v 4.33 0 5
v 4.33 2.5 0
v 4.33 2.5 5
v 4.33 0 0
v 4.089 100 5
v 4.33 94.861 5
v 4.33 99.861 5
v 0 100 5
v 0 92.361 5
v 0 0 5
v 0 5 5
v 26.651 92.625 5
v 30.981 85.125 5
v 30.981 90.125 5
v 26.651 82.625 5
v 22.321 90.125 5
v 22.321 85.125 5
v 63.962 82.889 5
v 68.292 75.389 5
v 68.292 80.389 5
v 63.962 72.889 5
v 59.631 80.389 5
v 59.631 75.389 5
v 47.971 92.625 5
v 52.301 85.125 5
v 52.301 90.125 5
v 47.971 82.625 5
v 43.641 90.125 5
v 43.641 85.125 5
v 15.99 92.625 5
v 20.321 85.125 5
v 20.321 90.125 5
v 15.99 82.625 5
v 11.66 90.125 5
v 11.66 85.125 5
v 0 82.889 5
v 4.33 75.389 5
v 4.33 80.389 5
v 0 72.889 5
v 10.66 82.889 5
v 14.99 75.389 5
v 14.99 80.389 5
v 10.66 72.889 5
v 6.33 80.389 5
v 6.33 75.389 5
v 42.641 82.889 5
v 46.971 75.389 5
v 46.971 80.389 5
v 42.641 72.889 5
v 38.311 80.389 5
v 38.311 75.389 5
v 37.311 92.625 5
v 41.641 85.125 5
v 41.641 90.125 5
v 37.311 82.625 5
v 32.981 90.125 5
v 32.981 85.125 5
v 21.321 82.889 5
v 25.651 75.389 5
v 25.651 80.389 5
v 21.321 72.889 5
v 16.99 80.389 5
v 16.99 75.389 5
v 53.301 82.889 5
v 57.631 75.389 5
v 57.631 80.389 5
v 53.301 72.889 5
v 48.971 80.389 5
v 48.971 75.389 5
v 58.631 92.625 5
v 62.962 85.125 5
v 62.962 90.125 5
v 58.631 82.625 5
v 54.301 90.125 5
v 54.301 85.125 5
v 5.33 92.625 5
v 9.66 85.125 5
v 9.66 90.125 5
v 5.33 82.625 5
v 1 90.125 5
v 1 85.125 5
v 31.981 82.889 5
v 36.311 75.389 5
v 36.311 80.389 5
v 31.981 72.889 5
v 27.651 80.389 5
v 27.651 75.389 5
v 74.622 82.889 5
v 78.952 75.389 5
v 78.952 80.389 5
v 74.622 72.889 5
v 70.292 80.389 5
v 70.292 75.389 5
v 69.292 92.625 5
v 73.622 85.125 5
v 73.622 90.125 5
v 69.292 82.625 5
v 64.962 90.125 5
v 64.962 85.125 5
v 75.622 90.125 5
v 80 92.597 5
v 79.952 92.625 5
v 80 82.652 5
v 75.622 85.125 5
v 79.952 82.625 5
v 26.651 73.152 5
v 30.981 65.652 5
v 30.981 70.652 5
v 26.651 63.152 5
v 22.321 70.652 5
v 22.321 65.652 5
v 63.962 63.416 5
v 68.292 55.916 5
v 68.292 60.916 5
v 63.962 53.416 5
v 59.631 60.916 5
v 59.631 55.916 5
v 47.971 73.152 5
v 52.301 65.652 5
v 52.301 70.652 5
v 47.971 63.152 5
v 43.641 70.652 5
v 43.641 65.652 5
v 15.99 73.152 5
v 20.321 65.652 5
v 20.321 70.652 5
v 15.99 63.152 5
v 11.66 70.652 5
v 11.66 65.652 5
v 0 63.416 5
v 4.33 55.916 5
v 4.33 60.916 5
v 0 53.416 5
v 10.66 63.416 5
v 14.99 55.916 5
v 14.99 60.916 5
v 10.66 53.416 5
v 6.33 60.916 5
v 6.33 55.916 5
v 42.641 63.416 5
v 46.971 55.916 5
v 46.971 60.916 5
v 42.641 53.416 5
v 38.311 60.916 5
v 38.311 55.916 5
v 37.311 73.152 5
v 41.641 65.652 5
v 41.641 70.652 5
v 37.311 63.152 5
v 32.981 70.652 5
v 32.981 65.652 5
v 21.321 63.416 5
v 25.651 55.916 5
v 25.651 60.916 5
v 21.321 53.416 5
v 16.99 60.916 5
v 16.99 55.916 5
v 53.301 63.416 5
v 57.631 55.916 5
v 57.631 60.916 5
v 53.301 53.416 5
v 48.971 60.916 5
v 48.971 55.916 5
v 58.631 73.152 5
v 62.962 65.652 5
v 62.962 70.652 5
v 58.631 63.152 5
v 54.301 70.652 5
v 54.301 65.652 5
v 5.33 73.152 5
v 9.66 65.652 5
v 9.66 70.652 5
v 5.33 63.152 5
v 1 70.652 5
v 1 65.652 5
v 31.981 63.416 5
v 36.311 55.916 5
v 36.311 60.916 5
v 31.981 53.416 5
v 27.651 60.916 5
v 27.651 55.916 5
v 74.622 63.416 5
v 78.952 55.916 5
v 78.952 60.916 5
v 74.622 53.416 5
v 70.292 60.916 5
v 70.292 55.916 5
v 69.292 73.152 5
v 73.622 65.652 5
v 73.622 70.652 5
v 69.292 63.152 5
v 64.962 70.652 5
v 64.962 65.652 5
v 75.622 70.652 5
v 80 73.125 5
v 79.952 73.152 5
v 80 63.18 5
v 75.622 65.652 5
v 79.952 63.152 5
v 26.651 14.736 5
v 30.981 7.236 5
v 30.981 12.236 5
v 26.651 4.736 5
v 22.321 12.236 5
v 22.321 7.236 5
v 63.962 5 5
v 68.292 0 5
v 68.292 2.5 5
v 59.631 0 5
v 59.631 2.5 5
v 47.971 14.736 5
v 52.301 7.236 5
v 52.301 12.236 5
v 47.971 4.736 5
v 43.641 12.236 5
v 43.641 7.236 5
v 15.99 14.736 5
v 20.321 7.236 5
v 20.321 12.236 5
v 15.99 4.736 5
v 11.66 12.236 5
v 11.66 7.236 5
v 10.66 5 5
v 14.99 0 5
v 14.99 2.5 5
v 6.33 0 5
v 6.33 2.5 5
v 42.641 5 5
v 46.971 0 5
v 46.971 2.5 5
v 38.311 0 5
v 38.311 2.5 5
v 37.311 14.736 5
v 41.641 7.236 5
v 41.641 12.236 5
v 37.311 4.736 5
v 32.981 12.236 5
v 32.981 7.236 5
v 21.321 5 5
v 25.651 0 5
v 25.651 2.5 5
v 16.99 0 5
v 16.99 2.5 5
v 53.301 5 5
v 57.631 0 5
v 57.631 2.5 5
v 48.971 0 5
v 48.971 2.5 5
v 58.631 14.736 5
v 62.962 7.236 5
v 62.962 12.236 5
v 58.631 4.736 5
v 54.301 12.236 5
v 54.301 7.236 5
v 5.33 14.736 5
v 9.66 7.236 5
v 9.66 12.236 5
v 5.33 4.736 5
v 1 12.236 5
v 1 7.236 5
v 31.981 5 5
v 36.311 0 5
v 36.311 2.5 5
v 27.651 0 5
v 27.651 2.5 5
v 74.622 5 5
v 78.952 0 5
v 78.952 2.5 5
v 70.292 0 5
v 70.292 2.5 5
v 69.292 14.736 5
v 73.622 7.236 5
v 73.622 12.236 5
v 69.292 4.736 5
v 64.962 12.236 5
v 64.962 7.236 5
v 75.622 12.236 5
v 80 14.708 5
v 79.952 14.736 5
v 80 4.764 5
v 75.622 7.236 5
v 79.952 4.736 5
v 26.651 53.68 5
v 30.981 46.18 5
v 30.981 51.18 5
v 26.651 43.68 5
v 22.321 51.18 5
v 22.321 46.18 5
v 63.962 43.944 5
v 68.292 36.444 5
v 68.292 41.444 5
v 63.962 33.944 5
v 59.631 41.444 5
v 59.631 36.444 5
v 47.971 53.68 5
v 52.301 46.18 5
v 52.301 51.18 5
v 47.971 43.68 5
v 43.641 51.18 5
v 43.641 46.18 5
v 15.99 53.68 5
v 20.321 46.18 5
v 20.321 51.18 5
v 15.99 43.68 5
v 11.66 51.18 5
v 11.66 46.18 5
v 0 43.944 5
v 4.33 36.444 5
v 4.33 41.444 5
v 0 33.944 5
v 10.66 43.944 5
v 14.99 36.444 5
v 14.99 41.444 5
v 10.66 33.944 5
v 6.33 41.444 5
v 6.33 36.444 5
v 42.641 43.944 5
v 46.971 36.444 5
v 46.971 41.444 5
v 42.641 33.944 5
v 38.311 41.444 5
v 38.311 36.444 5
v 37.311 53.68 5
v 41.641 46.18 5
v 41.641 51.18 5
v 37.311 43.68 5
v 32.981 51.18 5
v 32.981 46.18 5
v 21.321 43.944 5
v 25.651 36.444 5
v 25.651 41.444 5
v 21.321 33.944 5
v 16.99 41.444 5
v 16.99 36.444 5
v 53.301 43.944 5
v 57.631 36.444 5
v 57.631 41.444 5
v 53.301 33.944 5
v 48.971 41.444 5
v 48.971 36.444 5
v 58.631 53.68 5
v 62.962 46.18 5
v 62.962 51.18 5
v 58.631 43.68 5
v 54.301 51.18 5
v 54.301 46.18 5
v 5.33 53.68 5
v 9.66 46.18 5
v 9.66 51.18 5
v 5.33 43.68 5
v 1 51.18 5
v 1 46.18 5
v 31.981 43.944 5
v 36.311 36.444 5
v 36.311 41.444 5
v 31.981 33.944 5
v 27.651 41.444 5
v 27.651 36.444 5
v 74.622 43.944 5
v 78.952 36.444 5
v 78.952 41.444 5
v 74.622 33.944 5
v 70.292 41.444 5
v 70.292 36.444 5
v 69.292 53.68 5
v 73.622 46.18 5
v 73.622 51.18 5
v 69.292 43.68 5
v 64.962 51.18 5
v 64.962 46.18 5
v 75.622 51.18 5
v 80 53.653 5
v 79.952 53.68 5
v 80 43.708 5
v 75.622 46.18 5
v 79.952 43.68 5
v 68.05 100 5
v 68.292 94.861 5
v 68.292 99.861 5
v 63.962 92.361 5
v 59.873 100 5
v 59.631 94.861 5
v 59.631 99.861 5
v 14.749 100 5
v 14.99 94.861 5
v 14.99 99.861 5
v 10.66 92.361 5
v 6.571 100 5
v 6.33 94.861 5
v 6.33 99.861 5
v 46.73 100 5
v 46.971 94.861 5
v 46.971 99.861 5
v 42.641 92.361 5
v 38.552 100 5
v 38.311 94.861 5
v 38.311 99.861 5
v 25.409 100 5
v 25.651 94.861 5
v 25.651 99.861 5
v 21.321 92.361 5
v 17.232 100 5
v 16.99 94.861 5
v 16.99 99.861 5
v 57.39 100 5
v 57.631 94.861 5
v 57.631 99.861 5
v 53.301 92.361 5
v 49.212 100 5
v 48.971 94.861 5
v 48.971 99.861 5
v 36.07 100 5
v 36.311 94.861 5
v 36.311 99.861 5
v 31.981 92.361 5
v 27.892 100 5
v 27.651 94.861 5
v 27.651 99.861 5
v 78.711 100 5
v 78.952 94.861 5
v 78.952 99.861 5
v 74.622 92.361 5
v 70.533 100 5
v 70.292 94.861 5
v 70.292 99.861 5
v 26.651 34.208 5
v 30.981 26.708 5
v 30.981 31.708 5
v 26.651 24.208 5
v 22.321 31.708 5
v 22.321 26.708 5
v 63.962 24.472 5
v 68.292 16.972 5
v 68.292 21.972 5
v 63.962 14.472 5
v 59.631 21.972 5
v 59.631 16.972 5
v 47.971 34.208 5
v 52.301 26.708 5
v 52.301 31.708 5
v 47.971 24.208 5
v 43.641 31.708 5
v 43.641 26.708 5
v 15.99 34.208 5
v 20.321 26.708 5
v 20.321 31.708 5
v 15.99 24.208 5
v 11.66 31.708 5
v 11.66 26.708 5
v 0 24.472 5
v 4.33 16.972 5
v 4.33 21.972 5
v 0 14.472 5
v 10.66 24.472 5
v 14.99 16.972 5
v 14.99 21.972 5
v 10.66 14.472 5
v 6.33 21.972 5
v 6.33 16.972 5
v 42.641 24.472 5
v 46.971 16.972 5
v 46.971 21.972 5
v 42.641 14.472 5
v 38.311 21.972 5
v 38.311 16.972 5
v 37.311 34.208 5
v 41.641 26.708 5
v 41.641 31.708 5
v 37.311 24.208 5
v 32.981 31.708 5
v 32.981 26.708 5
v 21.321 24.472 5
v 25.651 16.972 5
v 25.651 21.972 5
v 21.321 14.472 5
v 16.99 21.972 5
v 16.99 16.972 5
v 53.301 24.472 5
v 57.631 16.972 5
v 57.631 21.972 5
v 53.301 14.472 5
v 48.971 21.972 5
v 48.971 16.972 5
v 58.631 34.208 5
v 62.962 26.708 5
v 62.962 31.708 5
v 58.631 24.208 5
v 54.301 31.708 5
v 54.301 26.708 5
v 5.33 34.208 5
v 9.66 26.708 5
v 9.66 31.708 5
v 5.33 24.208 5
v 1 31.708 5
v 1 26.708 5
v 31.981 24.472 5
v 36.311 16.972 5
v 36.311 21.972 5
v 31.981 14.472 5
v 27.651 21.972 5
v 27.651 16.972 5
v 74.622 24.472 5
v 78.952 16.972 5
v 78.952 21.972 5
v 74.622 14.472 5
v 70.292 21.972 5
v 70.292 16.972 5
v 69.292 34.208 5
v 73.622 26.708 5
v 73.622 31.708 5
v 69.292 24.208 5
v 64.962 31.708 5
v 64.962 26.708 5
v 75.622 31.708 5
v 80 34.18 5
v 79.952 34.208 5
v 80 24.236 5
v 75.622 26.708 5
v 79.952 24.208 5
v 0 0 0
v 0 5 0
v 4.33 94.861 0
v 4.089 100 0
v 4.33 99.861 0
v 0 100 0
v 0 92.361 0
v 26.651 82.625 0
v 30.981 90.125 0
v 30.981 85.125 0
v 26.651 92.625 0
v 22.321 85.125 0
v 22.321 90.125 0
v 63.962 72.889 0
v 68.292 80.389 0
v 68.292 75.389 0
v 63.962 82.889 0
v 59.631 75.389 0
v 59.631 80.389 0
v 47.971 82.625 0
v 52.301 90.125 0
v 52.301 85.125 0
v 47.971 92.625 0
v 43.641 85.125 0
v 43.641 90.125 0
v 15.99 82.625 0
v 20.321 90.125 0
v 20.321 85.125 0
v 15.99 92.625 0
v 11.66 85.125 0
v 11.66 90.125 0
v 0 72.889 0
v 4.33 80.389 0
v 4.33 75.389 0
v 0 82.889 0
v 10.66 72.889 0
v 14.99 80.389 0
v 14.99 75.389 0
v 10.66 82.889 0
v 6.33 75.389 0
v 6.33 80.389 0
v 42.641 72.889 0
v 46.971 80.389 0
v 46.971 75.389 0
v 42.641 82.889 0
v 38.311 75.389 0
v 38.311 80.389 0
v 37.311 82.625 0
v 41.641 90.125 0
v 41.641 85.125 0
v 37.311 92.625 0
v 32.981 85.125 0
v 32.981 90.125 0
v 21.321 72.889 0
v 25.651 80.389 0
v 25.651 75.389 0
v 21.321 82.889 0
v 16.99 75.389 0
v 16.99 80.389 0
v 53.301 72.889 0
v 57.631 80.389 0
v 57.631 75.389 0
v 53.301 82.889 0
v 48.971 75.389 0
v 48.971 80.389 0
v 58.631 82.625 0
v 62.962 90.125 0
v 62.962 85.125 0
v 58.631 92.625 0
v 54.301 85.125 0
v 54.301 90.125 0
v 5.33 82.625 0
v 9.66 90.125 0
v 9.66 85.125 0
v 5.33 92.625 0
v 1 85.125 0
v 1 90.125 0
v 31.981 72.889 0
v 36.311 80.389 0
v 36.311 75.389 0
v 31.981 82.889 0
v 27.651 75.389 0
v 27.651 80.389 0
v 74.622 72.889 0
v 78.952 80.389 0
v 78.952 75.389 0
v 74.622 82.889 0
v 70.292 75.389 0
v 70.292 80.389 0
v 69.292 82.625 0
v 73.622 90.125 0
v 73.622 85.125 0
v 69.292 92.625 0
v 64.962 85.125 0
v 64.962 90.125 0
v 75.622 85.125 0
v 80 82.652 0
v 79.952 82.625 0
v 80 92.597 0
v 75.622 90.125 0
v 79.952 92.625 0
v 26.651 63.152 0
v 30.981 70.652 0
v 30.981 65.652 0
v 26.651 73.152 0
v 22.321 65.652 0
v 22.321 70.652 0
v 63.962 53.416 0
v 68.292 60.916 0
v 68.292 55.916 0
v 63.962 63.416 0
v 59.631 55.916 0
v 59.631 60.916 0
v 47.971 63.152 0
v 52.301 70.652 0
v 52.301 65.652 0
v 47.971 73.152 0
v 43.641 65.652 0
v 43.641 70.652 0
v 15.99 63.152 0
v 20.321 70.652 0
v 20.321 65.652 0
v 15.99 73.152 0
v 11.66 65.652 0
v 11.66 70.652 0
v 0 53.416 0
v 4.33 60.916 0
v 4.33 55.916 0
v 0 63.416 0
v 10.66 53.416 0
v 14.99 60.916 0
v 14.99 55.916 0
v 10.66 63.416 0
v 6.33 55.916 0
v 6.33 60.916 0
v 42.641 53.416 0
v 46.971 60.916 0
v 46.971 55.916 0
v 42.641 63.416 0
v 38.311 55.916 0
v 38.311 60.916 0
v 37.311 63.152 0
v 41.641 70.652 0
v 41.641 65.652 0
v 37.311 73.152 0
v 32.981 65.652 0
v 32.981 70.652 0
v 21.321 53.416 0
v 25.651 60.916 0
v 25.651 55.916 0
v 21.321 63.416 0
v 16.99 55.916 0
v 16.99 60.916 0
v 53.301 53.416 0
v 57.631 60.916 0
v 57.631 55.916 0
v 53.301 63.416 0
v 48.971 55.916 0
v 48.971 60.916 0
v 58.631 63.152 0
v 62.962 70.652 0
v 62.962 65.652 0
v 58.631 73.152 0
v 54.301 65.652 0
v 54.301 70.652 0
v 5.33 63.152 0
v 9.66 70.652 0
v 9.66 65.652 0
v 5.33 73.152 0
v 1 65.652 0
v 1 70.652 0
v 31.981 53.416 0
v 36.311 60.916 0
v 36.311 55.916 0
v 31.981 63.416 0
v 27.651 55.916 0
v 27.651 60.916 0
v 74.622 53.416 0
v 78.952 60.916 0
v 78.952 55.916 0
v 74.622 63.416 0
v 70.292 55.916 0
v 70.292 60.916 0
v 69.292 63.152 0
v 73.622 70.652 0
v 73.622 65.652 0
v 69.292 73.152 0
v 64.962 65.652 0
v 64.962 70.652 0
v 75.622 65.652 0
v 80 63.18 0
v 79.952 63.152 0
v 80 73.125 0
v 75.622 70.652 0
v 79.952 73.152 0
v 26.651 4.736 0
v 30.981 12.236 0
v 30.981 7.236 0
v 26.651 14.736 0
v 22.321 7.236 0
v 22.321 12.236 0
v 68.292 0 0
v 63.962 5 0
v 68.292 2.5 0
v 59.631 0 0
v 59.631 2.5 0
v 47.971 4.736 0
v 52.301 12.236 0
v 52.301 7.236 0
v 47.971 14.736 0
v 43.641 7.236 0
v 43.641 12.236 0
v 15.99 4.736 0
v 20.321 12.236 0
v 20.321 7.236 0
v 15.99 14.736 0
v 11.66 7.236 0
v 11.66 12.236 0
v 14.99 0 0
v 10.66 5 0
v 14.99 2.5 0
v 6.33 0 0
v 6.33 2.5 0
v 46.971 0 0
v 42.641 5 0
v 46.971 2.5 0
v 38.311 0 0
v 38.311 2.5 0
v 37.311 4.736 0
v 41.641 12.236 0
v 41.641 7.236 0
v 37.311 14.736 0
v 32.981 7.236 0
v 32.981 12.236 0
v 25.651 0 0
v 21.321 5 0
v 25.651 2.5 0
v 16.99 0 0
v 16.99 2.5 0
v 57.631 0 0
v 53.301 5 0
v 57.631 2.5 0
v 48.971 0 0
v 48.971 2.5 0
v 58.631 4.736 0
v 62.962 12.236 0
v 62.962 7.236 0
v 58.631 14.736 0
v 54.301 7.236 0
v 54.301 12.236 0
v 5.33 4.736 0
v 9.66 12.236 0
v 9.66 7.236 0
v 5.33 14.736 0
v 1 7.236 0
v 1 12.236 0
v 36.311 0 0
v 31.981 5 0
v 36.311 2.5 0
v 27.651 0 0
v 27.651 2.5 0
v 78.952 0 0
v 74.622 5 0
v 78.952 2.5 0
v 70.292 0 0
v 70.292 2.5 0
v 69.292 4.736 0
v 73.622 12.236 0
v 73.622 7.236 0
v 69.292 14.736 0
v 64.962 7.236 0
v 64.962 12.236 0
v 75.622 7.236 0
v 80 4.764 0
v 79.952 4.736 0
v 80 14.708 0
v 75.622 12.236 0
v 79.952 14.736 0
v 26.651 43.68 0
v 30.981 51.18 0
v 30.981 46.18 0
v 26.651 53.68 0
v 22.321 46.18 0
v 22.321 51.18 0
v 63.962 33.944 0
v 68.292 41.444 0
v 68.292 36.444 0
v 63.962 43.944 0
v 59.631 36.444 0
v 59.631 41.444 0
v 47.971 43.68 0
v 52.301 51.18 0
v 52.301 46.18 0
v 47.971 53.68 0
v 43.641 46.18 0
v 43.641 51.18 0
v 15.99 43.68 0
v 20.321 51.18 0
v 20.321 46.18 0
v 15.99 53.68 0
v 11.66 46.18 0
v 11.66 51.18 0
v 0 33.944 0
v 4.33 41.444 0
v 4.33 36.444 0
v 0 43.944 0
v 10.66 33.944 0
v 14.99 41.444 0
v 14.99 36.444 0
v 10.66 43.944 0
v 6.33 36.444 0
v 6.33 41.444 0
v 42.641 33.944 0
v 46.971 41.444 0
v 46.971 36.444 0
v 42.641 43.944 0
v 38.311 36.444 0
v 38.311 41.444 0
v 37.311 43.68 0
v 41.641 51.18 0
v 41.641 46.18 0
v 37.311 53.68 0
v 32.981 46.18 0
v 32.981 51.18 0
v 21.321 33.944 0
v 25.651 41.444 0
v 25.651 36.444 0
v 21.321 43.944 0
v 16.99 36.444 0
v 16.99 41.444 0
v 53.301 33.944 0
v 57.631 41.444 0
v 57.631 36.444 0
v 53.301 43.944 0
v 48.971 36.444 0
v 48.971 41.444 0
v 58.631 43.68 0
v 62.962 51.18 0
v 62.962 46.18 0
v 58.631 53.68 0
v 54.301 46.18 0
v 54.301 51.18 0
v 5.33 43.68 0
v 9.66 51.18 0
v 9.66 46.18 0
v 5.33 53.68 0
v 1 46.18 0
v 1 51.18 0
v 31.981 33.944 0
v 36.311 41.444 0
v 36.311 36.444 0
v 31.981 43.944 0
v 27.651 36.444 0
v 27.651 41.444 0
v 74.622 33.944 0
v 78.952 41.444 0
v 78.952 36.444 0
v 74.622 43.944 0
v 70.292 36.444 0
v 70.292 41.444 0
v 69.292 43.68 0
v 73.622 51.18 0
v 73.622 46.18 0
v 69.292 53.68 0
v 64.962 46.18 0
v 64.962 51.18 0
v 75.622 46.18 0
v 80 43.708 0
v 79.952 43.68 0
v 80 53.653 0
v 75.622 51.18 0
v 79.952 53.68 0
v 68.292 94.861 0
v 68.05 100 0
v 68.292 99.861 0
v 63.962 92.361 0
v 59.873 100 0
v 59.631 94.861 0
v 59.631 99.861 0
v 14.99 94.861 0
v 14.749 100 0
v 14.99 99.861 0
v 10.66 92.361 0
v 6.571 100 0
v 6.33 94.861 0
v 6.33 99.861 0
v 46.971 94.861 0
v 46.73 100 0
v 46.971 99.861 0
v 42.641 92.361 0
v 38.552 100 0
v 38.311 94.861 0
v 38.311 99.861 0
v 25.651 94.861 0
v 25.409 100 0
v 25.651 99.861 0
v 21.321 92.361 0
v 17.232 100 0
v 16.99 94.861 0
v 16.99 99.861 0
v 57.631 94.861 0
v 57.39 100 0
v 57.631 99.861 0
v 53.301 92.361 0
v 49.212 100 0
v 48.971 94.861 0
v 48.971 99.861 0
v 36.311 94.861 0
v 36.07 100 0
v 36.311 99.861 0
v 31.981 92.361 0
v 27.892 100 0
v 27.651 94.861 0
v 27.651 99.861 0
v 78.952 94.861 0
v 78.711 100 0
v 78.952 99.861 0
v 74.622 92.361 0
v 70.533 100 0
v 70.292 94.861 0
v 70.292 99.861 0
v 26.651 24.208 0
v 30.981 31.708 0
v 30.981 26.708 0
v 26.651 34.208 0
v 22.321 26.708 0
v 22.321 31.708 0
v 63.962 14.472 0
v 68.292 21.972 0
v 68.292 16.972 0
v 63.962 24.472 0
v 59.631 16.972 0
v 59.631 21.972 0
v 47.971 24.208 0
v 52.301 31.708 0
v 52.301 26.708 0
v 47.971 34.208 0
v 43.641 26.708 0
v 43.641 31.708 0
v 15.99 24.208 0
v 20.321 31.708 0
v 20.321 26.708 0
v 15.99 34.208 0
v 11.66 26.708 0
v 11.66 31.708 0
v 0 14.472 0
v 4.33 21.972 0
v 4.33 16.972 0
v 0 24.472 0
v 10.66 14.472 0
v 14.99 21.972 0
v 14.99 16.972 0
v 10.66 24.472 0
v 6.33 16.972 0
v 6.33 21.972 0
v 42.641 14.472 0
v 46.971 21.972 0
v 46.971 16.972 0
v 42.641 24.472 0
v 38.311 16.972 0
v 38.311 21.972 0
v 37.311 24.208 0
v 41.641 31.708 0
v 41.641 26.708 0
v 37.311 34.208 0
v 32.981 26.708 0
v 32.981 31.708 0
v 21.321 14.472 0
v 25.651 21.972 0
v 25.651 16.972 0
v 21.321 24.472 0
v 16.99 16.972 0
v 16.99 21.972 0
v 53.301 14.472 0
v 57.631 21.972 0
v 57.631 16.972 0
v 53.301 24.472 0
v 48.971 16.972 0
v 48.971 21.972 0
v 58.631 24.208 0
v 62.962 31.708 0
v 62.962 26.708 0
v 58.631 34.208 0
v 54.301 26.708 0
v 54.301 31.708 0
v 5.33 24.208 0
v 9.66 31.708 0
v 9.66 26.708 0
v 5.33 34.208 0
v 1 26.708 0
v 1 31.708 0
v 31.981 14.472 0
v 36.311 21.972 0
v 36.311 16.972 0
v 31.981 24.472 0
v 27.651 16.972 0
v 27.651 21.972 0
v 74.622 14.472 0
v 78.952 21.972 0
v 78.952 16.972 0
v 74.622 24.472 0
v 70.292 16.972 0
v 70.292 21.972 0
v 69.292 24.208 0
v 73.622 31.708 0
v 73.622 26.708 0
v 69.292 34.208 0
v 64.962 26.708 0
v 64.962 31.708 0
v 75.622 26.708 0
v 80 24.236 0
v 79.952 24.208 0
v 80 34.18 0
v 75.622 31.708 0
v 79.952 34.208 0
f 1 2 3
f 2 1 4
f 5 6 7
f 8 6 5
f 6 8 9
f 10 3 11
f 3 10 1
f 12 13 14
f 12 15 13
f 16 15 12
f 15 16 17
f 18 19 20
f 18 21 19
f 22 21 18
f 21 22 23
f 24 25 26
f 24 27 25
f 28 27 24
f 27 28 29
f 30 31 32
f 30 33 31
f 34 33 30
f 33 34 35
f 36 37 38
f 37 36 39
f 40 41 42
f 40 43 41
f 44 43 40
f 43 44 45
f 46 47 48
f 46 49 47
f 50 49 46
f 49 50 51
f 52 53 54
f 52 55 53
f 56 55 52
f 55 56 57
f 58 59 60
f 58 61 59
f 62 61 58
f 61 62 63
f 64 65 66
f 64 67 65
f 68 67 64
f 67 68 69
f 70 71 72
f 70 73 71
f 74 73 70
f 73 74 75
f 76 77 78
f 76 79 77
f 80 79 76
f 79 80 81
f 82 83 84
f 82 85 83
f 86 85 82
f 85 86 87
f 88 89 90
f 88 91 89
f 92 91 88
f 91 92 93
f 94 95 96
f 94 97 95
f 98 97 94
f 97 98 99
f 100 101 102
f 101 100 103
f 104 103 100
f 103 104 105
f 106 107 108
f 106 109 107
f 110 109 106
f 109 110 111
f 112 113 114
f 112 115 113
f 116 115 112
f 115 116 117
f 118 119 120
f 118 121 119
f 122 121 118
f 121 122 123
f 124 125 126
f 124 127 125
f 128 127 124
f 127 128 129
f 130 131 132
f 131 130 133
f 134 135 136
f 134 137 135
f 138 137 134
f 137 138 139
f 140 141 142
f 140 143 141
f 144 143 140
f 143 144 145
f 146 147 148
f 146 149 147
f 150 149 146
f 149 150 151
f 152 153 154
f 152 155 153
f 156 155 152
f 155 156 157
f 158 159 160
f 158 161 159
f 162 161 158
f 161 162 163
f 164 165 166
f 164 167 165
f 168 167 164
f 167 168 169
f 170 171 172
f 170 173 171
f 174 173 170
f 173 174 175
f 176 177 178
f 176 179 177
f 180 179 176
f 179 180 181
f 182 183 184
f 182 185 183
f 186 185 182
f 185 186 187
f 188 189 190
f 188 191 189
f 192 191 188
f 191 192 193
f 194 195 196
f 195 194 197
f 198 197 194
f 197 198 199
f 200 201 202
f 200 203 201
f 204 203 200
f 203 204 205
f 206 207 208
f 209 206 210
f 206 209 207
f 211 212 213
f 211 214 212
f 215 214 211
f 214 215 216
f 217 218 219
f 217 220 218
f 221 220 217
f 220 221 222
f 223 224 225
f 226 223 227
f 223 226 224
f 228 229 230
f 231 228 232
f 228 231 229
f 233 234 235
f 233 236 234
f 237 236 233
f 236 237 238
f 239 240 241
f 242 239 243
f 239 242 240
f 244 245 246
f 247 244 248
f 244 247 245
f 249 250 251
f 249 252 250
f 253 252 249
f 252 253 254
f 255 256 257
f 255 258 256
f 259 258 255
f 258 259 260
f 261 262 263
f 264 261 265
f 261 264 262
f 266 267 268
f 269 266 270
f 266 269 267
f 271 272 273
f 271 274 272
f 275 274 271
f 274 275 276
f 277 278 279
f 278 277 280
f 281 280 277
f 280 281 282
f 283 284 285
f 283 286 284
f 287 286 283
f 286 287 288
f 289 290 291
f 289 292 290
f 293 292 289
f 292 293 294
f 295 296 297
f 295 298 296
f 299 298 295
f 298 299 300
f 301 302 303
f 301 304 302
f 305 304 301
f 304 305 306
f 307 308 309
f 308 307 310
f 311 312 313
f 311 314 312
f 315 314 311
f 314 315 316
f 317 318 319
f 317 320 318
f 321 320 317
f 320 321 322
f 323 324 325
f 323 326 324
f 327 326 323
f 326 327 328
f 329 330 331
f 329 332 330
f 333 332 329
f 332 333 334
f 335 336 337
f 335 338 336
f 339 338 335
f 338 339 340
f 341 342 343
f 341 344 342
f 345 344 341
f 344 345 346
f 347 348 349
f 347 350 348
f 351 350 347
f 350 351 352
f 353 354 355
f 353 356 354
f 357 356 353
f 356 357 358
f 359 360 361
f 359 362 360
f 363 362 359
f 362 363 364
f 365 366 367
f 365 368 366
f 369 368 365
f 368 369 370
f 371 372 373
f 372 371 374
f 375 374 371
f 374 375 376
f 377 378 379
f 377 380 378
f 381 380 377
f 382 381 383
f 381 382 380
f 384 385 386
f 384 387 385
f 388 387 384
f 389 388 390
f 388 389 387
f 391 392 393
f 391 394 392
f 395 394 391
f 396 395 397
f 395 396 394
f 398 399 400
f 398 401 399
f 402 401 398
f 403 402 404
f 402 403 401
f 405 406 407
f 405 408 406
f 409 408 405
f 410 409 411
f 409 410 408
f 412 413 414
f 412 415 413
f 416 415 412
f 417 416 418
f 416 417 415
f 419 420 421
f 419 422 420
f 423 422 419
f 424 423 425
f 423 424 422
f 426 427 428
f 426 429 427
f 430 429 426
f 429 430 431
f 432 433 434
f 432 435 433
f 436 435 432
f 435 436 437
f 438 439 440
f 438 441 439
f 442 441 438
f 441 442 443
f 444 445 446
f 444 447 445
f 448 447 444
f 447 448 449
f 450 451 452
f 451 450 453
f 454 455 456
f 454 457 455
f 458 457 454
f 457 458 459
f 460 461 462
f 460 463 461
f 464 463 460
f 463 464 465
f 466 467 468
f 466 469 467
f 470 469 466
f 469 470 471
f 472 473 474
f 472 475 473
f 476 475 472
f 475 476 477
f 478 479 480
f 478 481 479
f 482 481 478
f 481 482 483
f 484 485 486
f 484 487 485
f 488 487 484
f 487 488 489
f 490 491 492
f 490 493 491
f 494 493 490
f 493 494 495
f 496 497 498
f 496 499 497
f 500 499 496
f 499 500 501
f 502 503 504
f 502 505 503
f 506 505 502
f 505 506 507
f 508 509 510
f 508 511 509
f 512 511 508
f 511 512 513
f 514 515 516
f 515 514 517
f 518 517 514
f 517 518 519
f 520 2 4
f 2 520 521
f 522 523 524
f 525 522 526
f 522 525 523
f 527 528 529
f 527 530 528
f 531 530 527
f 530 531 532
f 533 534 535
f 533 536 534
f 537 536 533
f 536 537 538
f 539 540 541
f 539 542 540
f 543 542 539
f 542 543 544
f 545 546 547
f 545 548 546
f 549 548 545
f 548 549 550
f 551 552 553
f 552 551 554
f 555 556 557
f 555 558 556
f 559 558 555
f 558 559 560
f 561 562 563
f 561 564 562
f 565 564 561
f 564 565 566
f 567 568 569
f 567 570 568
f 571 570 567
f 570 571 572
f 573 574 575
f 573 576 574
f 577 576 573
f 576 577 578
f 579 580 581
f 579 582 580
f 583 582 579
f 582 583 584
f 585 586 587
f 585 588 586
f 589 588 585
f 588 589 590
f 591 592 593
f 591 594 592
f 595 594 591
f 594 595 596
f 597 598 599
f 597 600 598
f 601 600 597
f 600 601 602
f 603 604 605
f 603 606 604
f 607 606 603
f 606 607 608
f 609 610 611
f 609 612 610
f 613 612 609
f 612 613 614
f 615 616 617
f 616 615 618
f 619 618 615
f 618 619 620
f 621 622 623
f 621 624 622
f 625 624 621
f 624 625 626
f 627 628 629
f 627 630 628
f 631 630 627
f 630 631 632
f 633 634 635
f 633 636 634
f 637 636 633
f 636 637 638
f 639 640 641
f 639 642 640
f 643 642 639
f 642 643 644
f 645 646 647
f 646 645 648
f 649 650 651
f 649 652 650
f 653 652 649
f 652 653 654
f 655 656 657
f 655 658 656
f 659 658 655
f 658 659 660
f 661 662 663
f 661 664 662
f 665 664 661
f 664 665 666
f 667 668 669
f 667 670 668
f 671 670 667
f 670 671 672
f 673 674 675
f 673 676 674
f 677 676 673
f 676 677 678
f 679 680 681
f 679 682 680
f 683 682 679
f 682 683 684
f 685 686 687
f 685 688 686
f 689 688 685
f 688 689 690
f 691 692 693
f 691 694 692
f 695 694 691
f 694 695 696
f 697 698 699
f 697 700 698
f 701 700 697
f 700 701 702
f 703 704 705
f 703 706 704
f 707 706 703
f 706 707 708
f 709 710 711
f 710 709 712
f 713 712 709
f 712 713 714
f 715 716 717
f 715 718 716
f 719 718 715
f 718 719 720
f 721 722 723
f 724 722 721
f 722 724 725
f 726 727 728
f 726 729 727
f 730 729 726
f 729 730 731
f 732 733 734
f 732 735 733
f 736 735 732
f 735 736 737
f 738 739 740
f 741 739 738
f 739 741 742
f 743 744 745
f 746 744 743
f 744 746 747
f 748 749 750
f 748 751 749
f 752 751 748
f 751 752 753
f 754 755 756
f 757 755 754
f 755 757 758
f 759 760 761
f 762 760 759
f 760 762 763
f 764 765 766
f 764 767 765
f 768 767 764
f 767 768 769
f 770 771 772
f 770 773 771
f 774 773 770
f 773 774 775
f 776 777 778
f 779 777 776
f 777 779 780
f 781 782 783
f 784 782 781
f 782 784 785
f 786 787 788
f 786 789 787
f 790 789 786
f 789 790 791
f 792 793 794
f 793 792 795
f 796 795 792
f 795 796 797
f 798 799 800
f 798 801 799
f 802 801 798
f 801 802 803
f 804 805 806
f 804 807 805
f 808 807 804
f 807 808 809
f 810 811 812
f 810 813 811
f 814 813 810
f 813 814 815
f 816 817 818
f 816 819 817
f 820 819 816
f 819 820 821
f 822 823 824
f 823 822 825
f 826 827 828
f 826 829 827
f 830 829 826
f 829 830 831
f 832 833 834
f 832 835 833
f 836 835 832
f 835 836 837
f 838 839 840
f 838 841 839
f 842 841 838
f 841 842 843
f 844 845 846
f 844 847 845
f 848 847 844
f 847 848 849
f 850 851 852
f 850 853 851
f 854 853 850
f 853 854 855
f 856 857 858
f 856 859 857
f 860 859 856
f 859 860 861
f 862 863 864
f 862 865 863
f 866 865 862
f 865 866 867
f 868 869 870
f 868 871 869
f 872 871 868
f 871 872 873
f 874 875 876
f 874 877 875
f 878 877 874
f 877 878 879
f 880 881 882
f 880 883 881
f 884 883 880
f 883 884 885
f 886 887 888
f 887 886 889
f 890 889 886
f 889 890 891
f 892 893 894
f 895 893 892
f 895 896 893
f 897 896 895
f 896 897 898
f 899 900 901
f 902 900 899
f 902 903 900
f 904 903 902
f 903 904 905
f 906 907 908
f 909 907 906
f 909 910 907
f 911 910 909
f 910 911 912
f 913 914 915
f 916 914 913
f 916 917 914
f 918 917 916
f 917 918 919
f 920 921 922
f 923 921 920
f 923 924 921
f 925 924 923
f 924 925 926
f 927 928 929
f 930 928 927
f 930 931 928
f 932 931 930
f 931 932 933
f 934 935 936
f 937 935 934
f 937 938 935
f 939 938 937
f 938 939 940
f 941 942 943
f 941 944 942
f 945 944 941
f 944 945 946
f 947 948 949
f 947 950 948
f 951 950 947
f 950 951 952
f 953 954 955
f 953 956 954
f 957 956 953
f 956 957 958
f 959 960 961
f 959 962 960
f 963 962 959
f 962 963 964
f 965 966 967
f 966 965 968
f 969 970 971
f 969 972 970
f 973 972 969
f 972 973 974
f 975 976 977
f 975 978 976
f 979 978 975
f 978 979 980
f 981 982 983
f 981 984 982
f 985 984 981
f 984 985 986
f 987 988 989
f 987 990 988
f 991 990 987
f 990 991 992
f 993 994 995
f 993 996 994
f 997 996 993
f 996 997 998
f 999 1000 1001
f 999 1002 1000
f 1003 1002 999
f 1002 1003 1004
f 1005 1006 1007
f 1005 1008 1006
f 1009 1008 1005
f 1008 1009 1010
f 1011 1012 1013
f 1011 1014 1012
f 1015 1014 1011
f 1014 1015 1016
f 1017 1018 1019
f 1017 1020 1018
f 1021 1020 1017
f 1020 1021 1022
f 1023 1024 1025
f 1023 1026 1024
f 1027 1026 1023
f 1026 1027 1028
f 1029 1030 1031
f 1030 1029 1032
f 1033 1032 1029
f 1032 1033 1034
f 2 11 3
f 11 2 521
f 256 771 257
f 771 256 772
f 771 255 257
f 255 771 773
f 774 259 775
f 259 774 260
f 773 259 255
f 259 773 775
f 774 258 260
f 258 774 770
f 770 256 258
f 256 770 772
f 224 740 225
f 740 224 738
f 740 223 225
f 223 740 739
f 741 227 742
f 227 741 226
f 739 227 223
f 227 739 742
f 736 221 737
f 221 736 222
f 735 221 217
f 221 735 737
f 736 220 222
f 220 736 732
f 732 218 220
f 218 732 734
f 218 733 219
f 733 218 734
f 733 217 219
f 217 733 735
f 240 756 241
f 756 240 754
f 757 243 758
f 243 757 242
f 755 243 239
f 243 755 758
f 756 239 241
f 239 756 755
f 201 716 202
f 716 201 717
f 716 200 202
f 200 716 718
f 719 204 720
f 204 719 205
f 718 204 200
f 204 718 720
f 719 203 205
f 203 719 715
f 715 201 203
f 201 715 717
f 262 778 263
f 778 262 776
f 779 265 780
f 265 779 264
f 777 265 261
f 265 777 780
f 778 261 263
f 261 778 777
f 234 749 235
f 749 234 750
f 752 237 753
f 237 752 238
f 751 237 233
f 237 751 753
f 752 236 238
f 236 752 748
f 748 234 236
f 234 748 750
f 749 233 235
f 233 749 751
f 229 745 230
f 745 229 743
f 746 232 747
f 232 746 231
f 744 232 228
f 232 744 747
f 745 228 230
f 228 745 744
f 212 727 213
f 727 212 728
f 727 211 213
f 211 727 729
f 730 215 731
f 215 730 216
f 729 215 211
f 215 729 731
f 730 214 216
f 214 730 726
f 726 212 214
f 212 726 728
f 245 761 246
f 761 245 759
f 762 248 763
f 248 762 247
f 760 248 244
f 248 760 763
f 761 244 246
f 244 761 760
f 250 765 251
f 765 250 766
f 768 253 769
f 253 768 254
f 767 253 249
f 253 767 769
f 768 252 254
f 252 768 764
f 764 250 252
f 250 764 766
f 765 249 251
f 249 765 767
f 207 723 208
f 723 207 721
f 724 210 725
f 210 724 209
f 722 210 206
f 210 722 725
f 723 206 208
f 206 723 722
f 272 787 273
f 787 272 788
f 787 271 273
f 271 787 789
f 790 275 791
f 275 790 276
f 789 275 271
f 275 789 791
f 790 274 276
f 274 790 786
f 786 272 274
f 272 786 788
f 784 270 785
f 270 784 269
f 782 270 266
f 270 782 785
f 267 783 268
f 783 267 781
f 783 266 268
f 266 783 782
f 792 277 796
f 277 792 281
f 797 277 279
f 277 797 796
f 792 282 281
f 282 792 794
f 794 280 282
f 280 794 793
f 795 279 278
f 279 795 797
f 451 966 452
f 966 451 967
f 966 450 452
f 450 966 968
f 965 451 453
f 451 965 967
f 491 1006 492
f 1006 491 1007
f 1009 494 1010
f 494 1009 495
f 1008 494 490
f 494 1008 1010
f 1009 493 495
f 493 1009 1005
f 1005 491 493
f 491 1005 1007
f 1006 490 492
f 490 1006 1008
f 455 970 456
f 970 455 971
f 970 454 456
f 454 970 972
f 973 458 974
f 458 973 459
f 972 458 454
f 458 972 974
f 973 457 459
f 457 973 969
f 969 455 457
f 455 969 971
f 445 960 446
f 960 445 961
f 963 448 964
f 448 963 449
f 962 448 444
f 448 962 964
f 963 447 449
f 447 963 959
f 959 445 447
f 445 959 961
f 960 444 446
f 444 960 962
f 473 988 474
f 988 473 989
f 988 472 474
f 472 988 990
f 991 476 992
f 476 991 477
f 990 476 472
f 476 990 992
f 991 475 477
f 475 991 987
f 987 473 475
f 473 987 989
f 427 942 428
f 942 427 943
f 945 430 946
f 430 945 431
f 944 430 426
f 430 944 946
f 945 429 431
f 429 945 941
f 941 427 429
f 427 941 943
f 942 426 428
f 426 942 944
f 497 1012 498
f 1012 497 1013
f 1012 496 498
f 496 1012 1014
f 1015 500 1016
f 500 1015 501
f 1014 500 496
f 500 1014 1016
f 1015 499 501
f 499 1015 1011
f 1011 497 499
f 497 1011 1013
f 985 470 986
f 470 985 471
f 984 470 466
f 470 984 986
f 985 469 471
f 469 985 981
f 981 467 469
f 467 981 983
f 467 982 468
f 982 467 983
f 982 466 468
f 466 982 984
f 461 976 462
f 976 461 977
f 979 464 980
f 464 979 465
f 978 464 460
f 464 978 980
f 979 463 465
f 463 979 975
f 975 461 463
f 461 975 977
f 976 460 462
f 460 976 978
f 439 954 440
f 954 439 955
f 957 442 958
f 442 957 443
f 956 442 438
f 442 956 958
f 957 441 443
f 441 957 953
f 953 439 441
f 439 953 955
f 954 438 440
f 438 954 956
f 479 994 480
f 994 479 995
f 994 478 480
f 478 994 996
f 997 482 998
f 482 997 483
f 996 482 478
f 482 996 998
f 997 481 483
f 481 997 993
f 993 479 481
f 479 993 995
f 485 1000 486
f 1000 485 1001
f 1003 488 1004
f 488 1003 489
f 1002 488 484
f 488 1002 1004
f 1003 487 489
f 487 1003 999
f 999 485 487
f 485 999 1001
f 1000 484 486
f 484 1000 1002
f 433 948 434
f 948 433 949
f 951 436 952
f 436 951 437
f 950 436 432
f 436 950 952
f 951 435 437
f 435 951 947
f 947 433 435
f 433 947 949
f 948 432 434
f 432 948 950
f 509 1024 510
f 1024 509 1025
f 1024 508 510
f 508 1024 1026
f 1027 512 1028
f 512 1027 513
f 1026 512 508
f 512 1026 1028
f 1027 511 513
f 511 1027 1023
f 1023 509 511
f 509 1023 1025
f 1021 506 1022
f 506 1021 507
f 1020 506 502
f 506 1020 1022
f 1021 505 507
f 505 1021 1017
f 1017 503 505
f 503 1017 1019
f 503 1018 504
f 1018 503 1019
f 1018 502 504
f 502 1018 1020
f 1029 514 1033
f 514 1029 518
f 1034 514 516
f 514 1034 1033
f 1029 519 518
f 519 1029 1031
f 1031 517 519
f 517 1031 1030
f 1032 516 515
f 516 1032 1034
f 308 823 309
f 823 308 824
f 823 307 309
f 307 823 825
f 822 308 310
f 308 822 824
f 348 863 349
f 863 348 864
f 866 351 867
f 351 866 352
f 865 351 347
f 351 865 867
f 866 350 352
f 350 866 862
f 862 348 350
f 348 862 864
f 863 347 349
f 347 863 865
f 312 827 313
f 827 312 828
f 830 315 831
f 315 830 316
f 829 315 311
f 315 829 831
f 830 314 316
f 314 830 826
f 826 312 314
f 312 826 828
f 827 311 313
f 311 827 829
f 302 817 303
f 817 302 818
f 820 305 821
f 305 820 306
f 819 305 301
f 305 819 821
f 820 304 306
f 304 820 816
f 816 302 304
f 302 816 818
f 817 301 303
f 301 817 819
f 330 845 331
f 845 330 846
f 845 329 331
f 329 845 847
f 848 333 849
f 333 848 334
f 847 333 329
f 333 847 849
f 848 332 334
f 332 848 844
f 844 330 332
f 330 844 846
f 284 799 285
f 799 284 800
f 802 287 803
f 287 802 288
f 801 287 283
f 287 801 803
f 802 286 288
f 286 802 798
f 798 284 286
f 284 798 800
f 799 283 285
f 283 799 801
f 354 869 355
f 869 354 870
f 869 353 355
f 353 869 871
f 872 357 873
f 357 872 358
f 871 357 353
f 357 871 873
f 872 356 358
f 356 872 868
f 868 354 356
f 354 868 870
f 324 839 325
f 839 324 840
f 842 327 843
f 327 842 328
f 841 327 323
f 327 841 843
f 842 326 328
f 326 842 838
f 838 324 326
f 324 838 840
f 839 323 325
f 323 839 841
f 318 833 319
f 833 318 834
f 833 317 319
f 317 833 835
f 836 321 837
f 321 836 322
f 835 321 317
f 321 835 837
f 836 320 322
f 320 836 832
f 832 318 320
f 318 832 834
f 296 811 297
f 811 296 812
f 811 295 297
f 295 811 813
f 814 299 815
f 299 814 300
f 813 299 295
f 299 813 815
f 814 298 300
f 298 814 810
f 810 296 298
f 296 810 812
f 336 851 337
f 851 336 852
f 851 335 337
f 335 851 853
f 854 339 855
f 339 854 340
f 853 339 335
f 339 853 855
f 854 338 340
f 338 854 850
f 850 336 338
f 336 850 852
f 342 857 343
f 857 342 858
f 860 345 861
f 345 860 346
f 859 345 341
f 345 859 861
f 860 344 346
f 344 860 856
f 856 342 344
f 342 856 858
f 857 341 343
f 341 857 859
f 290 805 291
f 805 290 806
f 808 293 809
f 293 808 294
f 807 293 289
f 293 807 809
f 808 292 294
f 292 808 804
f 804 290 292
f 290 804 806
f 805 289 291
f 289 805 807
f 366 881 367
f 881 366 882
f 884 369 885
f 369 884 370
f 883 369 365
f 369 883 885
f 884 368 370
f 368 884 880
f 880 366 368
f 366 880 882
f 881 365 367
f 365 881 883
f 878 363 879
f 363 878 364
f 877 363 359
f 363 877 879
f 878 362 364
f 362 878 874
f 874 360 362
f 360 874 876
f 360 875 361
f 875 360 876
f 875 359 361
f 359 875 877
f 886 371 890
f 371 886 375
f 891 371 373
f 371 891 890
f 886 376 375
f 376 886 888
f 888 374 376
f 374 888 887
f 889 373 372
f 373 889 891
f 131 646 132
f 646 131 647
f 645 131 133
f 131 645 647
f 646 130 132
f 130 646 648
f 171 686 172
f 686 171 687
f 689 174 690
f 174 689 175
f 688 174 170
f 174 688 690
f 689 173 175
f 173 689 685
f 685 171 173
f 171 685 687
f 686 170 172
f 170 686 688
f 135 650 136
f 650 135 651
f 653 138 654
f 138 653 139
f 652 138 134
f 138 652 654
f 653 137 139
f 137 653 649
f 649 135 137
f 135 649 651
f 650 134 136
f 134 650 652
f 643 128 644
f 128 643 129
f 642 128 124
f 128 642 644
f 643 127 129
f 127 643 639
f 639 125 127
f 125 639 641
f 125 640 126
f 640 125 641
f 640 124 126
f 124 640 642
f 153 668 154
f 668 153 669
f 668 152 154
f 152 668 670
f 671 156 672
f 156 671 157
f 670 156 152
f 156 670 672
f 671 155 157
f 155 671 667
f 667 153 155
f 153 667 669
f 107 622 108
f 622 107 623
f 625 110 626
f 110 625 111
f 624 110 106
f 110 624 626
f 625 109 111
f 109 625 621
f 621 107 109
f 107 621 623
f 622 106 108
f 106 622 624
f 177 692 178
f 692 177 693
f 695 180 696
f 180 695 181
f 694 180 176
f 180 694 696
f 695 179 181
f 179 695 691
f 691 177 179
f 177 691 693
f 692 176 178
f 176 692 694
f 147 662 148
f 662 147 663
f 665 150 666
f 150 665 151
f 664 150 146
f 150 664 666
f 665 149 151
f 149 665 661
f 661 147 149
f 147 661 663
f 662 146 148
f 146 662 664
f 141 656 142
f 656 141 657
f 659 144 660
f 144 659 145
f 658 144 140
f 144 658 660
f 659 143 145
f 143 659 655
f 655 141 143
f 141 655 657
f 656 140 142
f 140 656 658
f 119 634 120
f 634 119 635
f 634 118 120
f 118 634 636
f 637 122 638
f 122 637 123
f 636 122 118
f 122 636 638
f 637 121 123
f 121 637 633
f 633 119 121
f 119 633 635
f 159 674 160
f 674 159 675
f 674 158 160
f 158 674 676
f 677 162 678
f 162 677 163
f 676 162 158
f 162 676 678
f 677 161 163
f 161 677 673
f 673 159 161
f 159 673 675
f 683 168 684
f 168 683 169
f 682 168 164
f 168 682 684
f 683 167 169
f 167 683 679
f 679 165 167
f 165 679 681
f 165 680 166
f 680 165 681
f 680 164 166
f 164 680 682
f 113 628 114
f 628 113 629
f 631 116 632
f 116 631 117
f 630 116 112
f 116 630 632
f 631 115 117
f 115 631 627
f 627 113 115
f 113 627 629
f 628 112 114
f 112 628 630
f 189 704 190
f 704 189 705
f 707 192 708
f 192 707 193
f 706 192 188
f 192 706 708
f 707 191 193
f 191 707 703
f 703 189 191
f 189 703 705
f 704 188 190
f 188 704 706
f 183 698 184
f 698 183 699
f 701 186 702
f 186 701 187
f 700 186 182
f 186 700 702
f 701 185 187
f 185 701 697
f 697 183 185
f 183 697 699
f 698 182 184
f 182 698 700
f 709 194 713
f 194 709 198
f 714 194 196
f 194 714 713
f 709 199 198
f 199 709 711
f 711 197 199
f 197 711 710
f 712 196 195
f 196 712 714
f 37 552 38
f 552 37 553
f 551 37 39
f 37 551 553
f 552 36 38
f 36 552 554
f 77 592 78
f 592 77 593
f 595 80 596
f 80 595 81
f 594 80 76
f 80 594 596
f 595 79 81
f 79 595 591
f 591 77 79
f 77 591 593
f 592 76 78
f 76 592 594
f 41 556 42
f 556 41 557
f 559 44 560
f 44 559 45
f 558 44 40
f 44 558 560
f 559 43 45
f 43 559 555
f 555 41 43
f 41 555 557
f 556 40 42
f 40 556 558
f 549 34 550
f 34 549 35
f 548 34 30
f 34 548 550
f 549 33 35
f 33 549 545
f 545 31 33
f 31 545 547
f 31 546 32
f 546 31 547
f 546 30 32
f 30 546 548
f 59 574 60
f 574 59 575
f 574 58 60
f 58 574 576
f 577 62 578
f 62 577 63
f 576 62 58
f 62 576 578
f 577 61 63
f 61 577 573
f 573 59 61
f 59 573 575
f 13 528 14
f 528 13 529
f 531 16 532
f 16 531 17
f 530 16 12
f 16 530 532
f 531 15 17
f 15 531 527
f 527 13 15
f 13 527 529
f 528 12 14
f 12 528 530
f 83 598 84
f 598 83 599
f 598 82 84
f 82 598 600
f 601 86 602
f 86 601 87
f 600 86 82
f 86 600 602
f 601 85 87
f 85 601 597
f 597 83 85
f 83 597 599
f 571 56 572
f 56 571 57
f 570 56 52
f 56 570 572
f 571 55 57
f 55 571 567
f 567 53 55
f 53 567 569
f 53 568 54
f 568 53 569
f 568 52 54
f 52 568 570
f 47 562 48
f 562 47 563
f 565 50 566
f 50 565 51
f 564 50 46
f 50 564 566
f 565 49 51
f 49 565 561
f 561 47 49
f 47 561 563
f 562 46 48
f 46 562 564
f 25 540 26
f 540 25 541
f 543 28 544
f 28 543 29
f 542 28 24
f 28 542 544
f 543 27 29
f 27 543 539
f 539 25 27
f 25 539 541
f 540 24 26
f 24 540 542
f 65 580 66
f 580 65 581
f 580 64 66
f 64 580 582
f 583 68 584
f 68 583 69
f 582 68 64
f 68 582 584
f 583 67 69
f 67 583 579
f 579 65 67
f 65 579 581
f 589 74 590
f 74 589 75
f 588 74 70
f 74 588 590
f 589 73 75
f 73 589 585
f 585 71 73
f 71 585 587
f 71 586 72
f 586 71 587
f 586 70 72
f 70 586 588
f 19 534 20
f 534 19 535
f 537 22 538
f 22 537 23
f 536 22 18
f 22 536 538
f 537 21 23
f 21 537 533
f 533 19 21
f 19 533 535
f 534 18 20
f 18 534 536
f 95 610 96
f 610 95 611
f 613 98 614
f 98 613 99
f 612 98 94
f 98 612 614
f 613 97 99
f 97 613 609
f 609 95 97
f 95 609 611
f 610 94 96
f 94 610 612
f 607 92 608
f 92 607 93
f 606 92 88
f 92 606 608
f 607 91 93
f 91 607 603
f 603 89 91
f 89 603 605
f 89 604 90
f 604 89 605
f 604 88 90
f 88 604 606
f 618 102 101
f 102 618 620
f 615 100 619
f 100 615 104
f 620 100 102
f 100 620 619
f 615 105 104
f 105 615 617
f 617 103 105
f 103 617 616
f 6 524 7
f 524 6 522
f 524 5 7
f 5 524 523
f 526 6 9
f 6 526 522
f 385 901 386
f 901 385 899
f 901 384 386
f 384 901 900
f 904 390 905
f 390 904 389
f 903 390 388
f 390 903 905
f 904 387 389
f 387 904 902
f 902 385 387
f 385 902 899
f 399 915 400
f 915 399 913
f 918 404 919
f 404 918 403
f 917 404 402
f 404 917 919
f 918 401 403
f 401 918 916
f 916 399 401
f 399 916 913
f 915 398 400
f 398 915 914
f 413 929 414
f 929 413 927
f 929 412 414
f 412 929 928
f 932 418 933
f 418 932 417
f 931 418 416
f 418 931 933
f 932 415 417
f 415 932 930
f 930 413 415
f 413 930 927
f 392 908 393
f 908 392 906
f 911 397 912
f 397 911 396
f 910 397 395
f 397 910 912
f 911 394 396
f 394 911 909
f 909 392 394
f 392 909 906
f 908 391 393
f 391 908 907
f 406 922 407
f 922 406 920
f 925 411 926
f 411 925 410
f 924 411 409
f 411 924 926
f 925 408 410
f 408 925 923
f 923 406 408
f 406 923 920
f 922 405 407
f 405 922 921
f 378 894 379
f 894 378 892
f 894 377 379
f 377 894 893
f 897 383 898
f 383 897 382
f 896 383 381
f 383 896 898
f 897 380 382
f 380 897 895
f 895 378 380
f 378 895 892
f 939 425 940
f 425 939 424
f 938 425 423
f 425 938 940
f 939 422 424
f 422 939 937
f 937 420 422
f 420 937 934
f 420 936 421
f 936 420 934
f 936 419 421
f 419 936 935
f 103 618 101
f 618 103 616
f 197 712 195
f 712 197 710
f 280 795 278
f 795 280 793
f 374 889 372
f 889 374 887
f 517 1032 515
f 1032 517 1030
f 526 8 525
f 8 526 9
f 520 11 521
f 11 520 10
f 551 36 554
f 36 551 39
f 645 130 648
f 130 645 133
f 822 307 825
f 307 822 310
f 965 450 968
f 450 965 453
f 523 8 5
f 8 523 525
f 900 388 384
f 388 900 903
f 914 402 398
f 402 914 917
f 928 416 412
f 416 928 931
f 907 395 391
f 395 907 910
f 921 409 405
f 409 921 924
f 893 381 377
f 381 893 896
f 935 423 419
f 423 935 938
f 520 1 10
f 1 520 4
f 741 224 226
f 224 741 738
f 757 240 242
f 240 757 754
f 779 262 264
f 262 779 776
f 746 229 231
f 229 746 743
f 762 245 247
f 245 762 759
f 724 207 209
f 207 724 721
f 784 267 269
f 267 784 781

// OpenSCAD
$fn=50;

module hexagon(extrusion_height, radius) {
    rotate([0, 0, 90])
    cylinder($fn=6, h=extrusion_height, r=radius);
}

module hexagons(extrusion_height, radius, distance, x_reps, y_reps) {
    $hexagon_height = radius*2;
    $side = radius;

    // Using the pythagorean theorem:
    //
    //   (Width/2)^2 + (r/2)^2 = r^2
    //
    $hexagon_width = sqrt(3) * radius;

    // Using the pythagorean theorem:
    //
    //   VertDist^2 + (Dist/2)^2 = Dist^2
    //
    $vertical_distance = sqrt(1.25)*distance;

    $pattern_height = $hexagon_height + $vertical_distance * 2 + $side;
    $pattern_width = $hexagon_width + distance;

    for(index_y = [0:1:y_reps-1]){
        $y1 = index_y * $pattern_height;
        $y2 = $y1 + 0.75 * $hexagon_height + $vertical_distance;

        for(index_x = [0:1:x_reps-1]) {
            $x1 = index_x * $pattern_width;
            translate([$x1, $y1, 0])
            hexagon(extrusion_height, radius);

            $x2 = $x1 + $hexagon_width/2 + distance/2;

            translate([$x2, $y2, 0])
            hexagon(extrusion_height, radius);
        }
    }
}

module blocked_hexagons(extrusion_height, radius, distance, width, height) {
    $hexagon_height = radius * 2;
    $hexagon_width = sqrt(3) * radius;
    $x_reps = ceil(width / ($hexagon_width + distance)) + 1;
    $y_reps = ceil(height / ($hexagon_height + distance)) + 1;

    intersection() {
        cube([width, height, extrusion_height]);
        hexagons(extrusion_height, radius, distance, $x_reps, $y_reps);
    }
}

//hexagons(5, 5, distance=2, x_reps=20, y_reps=20);
blocked_hexagons(extrusion_height=5, radius=5, distance=2, width=80, height=100);
